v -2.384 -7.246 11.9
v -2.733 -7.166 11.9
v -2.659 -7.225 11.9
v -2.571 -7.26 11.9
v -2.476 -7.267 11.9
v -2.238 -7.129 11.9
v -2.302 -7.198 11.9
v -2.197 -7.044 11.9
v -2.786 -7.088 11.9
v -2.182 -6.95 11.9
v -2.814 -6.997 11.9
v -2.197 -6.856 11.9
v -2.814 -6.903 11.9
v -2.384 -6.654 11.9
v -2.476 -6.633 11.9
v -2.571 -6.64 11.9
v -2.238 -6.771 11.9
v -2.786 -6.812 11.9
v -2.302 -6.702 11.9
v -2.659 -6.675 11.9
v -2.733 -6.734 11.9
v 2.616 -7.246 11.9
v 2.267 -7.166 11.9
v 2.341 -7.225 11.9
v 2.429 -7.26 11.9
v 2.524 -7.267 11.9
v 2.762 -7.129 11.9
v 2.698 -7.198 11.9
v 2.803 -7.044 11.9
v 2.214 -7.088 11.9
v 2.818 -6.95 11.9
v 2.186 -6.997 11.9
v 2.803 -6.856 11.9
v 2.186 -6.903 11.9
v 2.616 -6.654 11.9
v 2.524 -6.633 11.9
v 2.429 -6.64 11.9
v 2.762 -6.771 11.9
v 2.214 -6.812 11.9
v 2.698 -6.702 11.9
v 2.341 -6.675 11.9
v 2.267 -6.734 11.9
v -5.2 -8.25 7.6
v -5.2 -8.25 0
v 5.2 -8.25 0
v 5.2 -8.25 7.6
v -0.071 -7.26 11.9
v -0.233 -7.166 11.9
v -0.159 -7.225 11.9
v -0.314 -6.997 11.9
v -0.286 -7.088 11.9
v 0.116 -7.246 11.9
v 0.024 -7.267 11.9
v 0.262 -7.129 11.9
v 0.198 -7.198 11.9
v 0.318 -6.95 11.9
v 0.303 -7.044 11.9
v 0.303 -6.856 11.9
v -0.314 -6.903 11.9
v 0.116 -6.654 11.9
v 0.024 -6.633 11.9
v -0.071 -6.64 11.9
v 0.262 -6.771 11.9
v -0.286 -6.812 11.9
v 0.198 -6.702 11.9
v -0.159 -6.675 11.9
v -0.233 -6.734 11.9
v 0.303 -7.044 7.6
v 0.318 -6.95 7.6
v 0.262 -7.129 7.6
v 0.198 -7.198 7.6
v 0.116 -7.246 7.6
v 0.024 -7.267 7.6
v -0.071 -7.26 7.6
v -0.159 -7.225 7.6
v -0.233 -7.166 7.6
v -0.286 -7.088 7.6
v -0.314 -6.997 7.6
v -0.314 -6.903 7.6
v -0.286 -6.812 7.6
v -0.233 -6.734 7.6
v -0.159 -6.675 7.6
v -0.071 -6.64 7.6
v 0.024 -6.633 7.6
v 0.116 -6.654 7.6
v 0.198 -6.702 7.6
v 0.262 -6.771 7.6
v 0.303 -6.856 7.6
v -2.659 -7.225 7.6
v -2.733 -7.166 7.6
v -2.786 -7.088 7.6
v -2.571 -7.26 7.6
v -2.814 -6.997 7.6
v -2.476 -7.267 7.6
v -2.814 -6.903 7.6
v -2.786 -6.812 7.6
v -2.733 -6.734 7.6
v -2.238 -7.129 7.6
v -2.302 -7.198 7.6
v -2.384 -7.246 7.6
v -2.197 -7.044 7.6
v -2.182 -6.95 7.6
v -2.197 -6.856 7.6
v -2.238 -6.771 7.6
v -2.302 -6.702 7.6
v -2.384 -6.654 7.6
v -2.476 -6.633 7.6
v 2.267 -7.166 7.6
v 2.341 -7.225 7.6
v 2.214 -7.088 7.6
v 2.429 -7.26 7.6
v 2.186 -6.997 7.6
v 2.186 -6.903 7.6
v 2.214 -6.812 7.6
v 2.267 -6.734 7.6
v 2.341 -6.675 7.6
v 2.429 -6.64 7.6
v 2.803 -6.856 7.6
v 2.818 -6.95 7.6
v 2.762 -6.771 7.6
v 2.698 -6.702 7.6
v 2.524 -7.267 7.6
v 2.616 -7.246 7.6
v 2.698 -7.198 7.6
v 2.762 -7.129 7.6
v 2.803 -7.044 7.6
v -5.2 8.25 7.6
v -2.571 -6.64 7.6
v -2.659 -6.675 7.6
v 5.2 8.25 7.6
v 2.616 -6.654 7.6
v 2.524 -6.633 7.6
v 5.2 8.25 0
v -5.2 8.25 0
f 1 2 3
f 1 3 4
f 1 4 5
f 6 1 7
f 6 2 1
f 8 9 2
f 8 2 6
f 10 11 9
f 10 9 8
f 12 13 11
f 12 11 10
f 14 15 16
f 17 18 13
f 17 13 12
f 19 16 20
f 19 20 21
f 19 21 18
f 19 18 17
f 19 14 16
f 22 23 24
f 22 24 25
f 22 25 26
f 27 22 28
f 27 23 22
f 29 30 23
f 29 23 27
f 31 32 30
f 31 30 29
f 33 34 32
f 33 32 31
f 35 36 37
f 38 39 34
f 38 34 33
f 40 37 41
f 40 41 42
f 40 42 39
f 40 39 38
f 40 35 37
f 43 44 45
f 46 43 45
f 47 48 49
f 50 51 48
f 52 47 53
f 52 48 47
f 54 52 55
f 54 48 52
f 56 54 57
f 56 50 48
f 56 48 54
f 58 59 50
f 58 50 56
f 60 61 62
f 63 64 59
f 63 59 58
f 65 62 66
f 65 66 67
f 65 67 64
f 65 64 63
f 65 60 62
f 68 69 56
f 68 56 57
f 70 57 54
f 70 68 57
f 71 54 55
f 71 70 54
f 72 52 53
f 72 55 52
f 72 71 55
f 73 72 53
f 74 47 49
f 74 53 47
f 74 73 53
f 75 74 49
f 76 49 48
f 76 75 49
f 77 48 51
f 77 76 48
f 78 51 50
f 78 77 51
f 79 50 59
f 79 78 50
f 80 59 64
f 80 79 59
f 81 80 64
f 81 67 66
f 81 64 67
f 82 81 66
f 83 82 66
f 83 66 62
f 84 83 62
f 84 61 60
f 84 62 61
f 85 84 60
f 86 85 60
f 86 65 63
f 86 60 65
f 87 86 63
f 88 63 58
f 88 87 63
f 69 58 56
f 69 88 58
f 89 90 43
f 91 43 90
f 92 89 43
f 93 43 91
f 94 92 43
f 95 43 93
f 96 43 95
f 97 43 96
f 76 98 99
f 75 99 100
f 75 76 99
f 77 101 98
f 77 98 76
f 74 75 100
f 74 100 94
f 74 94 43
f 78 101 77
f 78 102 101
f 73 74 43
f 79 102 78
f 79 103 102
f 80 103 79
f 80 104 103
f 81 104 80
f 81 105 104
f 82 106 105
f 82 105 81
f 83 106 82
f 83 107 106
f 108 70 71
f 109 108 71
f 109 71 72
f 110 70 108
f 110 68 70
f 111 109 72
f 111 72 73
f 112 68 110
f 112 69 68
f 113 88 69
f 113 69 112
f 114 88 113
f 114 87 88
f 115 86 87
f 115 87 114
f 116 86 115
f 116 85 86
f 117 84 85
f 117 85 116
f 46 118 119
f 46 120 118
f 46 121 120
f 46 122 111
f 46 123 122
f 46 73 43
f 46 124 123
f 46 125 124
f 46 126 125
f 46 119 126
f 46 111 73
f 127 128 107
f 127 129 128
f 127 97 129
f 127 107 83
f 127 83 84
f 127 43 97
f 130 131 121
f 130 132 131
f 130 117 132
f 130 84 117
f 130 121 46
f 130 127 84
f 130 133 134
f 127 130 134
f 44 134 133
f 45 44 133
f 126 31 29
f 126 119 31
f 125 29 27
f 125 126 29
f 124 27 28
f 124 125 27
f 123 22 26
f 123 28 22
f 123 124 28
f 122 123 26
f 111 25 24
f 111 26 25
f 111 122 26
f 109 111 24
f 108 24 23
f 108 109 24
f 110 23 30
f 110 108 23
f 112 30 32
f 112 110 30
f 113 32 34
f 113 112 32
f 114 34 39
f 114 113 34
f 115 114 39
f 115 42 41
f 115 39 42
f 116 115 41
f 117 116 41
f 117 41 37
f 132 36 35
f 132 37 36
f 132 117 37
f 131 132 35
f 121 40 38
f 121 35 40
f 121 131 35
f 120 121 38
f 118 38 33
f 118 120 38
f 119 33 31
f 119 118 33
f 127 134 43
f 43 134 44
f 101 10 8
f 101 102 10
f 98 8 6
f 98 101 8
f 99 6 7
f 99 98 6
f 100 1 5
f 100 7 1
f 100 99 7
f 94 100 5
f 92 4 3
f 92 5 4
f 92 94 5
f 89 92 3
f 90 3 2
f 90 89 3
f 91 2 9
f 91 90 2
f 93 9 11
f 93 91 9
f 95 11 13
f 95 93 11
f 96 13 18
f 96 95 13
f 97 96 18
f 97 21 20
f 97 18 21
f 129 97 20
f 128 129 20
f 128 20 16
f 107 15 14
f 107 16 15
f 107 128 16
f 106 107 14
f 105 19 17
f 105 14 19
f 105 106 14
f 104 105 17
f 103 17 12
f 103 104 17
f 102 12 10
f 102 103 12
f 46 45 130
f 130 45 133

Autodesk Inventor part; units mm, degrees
ref_plane "YZ Plane" through (0, 0, 0) normal (1, 0, 0) x (0, 1, 0)
ref_plane "XZ Plane" through (0, 0, 0) normal (0, 1, 0) x (-1, 0, 0)
ref_plane "XY Plane" through (0, 0, 0) normal (0, 0, 1) x (1, 0, 0)
sketch "スケッチ1" plane through (0, 0, 0) normal (0, 0, 1) x (1, 0, 0)
  line L0 (-5.2, -8.25) -> (5.2, -8.25)
  line L1 (5.2, -8.25) -> (5.2, 8.25)
  line L2 (5.2, 8.25) -> (-5.2, 8.25)
  line L3 (-5.2, 8.25) -> (-5.2, -8.25)
  line L4 (-5.2, -8.25) -> (5.2, 8.25) construction
  line L5 (5.2, -8.25) -> (-5.2, 8.25) construction
  point P0 (0, 0)
  dimension "d0" = 10.4
  dimension "d1" = 16.5
extrude "押し出し1" add sketch "スケッチ1" along normal blind 7.6
sketch "スケッチ2" plane through (0, 0, 7.6) normal (0, 0, 1) x (1, 0, 0)
  circle A0 centre (0, -6.95) radius 0.3175
  circle A1 centre (2.5, -6.95) radius 0.3175
  circle A2 centre (-2.5, -6.95) radius 0.3175
  line L0 (-5.2, -8.25) -> (5.2, -8.25) projected
  point P0 (0, 0)
  dimension "d4" = 1.3
  dimension "d5" = 0.635
  dimension "d6" = 2.5
  dimension "d7" = 2.5
extrude "押し出し2" add sketch "スケッチ2" along normal blind 4.3
properties part number "Circuit_OKI-78SR"
